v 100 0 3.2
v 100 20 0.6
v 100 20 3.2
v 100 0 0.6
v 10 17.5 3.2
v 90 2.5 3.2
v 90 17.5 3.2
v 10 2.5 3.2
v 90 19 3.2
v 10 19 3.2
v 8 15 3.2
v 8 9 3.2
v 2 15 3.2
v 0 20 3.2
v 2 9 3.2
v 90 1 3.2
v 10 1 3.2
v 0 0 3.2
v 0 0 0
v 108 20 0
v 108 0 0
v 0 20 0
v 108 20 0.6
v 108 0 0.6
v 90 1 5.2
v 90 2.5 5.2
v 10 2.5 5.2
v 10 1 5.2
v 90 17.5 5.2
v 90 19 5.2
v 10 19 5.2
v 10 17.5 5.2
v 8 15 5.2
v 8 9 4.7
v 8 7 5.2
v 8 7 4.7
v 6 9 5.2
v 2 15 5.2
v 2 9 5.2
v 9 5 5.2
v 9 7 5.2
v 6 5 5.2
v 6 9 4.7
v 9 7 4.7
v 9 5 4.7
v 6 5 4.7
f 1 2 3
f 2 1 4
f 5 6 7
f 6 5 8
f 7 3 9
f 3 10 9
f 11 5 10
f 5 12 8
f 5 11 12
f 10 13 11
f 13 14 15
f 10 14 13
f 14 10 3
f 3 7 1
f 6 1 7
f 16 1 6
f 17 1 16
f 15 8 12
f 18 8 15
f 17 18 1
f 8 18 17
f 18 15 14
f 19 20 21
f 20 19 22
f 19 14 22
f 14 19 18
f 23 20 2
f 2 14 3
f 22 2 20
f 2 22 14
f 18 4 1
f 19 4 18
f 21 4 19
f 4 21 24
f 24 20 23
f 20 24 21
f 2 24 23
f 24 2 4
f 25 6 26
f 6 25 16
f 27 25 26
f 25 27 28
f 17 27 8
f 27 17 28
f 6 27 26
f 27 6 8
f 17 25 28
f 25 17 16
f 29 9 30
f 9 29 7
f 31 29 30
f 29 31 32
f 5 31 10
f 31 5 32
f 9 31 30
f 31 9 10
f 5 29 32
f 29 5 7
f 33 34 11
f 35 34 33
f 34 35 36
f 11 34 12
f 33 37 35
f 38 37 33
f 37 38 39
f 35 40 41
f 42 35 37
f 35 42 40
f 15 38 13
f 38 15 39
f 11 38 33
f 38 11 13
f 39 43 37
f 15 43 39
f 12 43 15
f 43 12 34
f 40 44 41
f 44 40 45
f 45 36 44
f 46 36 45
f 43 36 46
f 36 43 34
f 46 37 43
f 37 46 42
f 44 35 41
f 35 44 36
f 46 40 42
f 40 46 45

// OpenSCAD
// Bag clip living hinge, PETG, 0.4 nozzle, no supports.
// Two halves contacting at hinge, open flat print pose.
// Fold: rotate upper 180 about [108,10,5.2] -Y. F(x)=216-x, F(z)=10.4-z.

part = "arm_lower"; // [arm_lower, arm_upper, assembly]
cadverify_only = "";

module instance(name, part, unit = 1) {
    echo(cadverify_instance = [name, part, unit]);
    if (cadverify_only == "" || cadverify_only == name) children();
}

module arm_lower() {
    cube([100, 20, 3.2], false);
    translate([99.9, 0, 0]) cube([8.1, 20, 0.6], false);
    translate([10, 1, 3.1]) cube([80, 1.5, 2.1], false);
    translate([10, 17.5, 3.1]) cube([80, 1.5, 2.1], false);
    // stop tower (central)
    translate([2, 9, 3.1]) cube([6, 6, 2.1], false);
    // lower hook base region uses body; hook lip + bridge
    translate([6, 5, 4.7]) cube([3, 2, 0.5], false);
    translate([6, 6.9, 4.7]) cube([2, 2.2, 0.5], false);
}

module arm_upper() {
    cube([8.1, 20, 0.6], false);
    translate([7.9, 0, 0]) cube([100.1, 20, 3.2], false);
    translate([100, 5, 3.1]) cube([6, 10, 2.1], false);
    translate([97.9, 6, 4.7]) cube([2.5, 8, 0.5], false);
    translate([107.9, 6, 0]) cube([8.1, 8, 3.2], false);
}

if (part == "arm_lower") {
    echo(cadverify_spec = [
        ["bounds", [[0, 0, 0], [108, 20, 5.2]]],
        ["bodies", 1],
        ["through_holes", 0],
        ["support_faces", [["bed", "-z", 1500]]],
        ["overhangs_allowed", [["latch lip", [[5.5, 4.5, 4.5], [9.5, 9.5, 5.5]]]]],
        ["copies", 1],
        ["details", [
            ["arm", "material", [[30, 10, 1.2], [70, 12, 2.0]], 1],
            ["arm_wall", "thickness", [50, 10, 10], [0, 0, -1], 3.2],
            ["hinge", "thickness", [104, 10, 5], [0, 0, -1], 0.6],
            ["rib", "material", [[30, 1.3, 3.8], [70, 2.2, 4.8]], 1],
            ["rib2", "material", [[30, 17.8, 3.8], [70, 18.7, 4.8]], 1],
            ["latch_tower", "material", [[3, 10, 3.8], [7, 14, 5.0]], 1],
            ["latch_lip", "material", [[6.5, 5.5, 4.8], [8.5, 6.5, 5.1]], 1],
            ["bag_slot", "void", [[30, 4, 3.8], [70, 16, 5.0]], 1]
        ]]
    ]);
    arm_lower();
} else if (part == "arm_upper") {
    echo(cadverify_spec = [
        ["bounds", [[0, 0, 0], [116, 20, 5.2]]],
        ["bodies", 1],
        ["through_holes", 0],
        ["support_faces", [["bed", "-z", 1500]]],
        ["overhangs_allowed", [["latch lip", [[97.5, 5.5, 4.5], [100.8, 14.5, 5.5]]]]],
        ["copies", 1],
        ["details", [
            ["arm", "material", [[30, 10, 1.2], [70, 12, 2.0]], 1],
            ["arm_wall", "thickness", [50, 10, 10], [0, 0, -1], 3.2],
            ["hinge", "thickness", [4, 10, 5], [0, 0, -1], 0.6],
            ["latch_tower", "material", [[100.5, 6, 3.8], [105.5, 13, 5.0]], 1],
            ["latch_lip", "material", [[98.2, 7, 4.8], [100.0, 13, 5.1]], 0.99],
            ["thumb_tab", "material", [[109, 7, 1.2], [114, 13, 2.0]], 0.99],
            ["field", "void", [[30, 4, 3.8], [70, 16, 5.0]], 1]
        ]]
    ]);
    arm_upper();
} else if (part == "assembly") {
    echo(cadverify_spec = [
        ["bounds", [[0, 0, 0], [224, 20, 5.2]]],
        ["support_faces", [["bed", "-z", 3000]]],
        ["motions", [
            ["close", ["upper"], "rotate", [108, 10, 5.2], [0, -1, 0], [0, 180],
                ["stops", [180]]
            ]
        ]],
        ["assembly_order", [
            [["lower"], [0, 0, 0]],
            [["upper"], [0, 0, -1]]
        ]]
    ]);
    instance("lower", "arm_lower") arm_lower();
    instance("upper", "arm_upper") translate([108, 0, 0]) arm_upper();
}
